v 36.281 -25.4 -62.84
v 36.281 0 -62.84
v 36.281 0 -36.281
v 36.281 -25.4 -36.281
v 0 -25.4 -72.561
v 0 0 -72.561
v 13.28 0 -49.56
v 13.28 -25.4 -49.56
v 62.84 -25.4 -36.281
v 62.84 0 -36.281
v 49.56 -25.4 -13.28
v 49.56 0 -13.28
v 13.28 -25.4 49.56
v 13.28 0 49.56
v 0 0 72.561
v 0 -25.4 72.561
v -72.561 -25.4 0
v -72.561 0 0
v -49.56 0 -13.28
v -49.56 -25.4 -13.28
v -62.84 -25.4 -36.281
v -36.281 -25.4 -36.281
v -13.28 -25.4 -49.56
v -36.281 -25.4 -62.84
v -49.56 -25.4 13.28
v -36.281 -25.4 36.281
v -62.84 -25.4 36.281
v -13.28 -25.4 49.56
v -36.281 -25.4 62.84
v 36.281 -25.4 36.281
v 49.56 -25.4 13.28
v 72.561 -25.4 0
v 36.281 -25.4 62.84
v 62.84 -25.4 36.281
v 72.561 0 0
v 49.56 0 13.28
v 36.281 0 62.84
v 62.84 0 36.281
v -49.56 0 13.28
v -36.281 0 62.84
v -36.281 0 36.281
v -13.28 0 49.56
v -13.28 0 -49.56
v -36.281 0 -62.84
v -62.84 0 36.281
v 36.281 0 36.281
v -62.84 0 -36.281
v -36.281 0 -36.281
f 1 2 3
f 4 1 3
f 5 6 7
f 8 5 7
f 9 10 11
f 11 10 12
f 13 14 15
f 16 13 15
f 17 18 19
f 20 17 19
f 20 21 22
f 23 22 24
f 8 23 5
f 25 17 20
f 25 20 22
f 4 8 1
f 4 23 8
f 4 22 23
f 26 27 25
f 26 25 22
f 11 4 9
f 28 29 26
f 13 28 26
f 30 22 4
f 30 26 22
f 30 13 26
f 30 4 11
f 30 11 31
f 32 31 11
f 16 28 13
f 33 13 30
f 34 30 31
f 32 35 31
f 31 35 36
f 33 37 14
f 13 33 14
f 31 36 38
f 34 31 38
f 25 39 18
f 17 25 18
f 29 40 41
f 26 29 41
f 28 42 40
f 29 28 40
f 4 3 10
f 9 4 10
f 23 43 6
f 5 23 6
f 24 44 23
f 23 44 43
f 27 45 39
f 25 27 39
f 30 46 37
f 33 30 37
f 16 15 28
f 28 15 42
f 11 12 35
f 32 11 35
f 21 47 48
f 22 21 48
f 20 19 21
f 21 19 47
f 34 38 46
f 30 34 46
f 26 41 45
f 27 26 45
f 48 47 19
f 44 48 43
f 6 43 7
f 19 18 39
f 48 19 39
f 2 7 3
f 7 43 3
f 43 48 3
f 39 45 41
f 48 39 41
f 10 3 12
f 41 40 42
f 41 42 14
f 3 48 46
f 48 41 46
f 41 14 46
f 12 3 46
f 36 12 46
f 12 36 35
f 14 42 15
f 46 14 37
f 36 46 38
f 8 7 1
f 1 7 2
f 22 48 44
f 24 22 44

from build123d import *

# Parameters (mm, degrees)
F0_R     = 38.1
F1_DEPTH = 25.4


with BuildPart() as f1:
    # F0 (on Front) → F1 (new body)
    with BuildSketch(Plane.XZ):
        with BuildLine():
            ThreePointArc((49.1988245643, 12.6536817364), (50.3981164721, 6.3772922205), (50.8, 0))
            ThreePointArc((50.8, 0), (50.3981164721, -6.3772922205), (49.1988245643, -12.6536817364))
            Line((49.1988245643, -12.6536817364), (49.5602090261, -13.2796179853))
            Line((49.5602090261, -13.2796179853), (72.5611820817, 0))
            Line((72.5611820817, 0), (49.5602090261, 13.2796179853))
            Line((49.5602090261, 13.2796179853), (49.1988245643, 12.6536817364))
        make_face()
        with BuildLine():
            ThreePointArc((48.9342727773, 13.641002447), (49.0690319755, 13.1480074912), (49.1988245643, 12.6536817364))
            Line((49.1988245643, 12.6536817364), (49.5602090261, 13.2796179853))
            Line((49.5602090261, 13.2796179853), (48.9342727773, 13.641002447))
        make_face()
        with BuildLine():
            Line((49.5602090261, -13.2796179853), (49.1988245643, -12.6536817364))
            ThreePointArc((49.1988245643, -12.6536817364), (49.0690319755, -13.1480074912), (48.9342727773, -13.641002447))
            Line((48.9342727773, -13.641002447), (49.5602090261, -13.2796179853))
        make_face()
        with BuildLine():
            ThreePointArc((36.2805910408, 35.5578221173), (43.9940905122, 25.4), (48.9342727773, 13.641002447))
            Line((48.9342727773, 13.641002447), (49.5602090261, 13.2796179853))
            Line((49.5602090261, 13.2796179853), (62.8398270114, 36.2805910408))
            Line((62.8398270114, 36.2805910408), (36.2805910408, 36.2805910408))
            Line((36.2805910408, 36.2805910408), (36.2805910408, 35.5578221173))
        make_face()
        with BuildLine():
            Line((49.5602090261, -13.2796179853), (48.9342727773, -13.641002447))
            ThreePointArc((48.9342727773, -13.641002447), (43.9940905122, -25.4), (36.2805910408, -35.5578221173))
            Line((36.2805910408, -35.5578221173), (36.2805910408, -36.2805910408))
            Line((36.2805910408, -36.2805910408), (62.8398270114, -36.2805910408))
            Line((62.8398270114, -36.2805910408), (49.5602090261, -13.2796179853))
        make_face()
        with BuildLine():
            ThreePointArc((35.5578221173, 36.2805910408), (35.9210244843, 35.9210244843), (36.2805910408, 35.5578221173))
            Line((36.2805910408, 35.5578221173), (36.2805910408, 36.2805910408))
            Line((36.2805910408, 36.2805910408), (35.5578221173, 36.2805910408))
        make_face()
        with BuildLine():
            Line((36.2805910408, -36.2805910408), (36.2805910408, -35.5578221173))
            ThreePointArc((36.2805910408, -35.5578221173), (35.9210244843, -35.9210244843), (35.5578221173, -36.2805910408))
            Line((35.5578221173, -36.2805910408), (36.2805910408, -36.2805910408))
        make_face()
        with BuildLine():
            ThreePointArc((13.641002447, 48.9342727773), (25.4, 43.9940905122), (35.5578221173, 36.2805910408))
            Line((35.5578221173, 36.2805910408), (36.2805910408, 36.2805910408))
            Line((36.2805910408, 36.2805910408), (36.2805910408, 62.8398270114))
            Line((36.2805910408, 62.8398270114), (13.2796179853, 49.5602090261))
            Line((13.2796179853, 49.5602090261), (13.641002447, 48.9342727773))
        make_face()
        with BuildLine():
            Line((36.2805910408, -36.2805910408), (35.5578221173, -36.2805910408))
            ThreePointArc((35.5578221173, -36.2805910408), (25.4, -43.9940905122), (13.641002447, -48.9342727773))
            Line((13.641002447, -48.9342727773), (13.2796179853, -49.5602090261))
            Line((13.2796179853, -49.5602090261), (36.2805910408, -62.8398270114))
            Line((36.2805910408, -62.8398270114), (36.2805910408, -36.2805910408))
        make_face()
        with BuildLine():
            ThreePointArc((12.6536817364, 49.1988245643), (13.1480074912, 49.0690319755), (13.641002447, 48.9342727773))
            Line((13.641002447, 48.9342727773), (13.2796179853, 49.5602090261))
            Line((13.2796179853, 49.5602090261), (12.6536817364, 49.1988245643))
        make_face()
        with BuildLine():
            Line((13.2796179853, -49.5602090261), (13.641002447, -48.9342727773))
            ThreePointArc((13.641002447, -48.9342727773), (13.1480074912, -49.0690319755), (12.6536817364, -49.1988245643))
            Line((12.6536817364, -49.1988245643), (13.2796179853, -49.5602090261))
        make_face()
        with BuildLine():
            ThreePointArc((-12.6536817364, 49.1988245643), (0, 50.8), (12.6536817364, 49.1988245643))
            Line((12.6536817364, 49.1988245643), (13.2796179853, 49.5602090261))
            Line((13.2796179853, 49.5602090261), (0, 72.5611820817))
            Line((0, 72.5611820817), (-13.2796179853, 49.5602090261))
            Line((-13.2796179853, 49.5602090261), (-12.6536817364, 49.1988245643))
        make_face()
        with BuildLine():
            Line((13.2796179853, -49.5602090261), (12.6536817364, -49.1988245643))
            ThreePointArc((12.6536817364, -49.1988245643), (0, -50.8), (-12.6536817364, -49.1988245643))
            Line((-12.6536817364, -49.1988245643), (-13.2796179853, -49.5602090261))
            Line((-13.2796179853, -49.5602090261), (0, -72.5611820817))
            Line((0, -72.5611820817), (13.2796179853, -49.5602090261))
        make_face()
        with BuildLine():
            ThreePointArc((-13.641002447, 48.9342727773), (-13.1480074912, 49.0690319755), (-12.6536817364, 49.1988245643))
            Line((-12.6536817364, 49.1988245643), (-13.2796179853, 49.5602090261))
            Line((-13.2796179853, 49.5602090261), (-13.641002447, 48.9342727773))
        make_face()
        with BuildLine():
            Line((-13.2796179853, -49.5602090261), (-12.6536817364, -49.1988245643))
            ThreePointArc((-12.6536817364, -49.1988245643), (-13.1480074912, -49.0690319755), (-13.641002447, -48.9342727773))
            Line((-13.641002447, -48.9342727773), (-13.2796179853, -49.5602090261))
        make_face()
        with BuildLine():
            ThreePointArc((-35.5578221173, 36.2805910408), (-25.4, 43.9940905122), (-13.641002447, 48.9342727773))
            Line((-13.641002447, 48.9342727773), (-13.2796179853, 49.5602090261))
            Line((-13.2796179853, 49.5602090261), (-36.2805910408, 62.8398270114))
            Line((-36.2805910408, 62.8398270114), (-36.2805910408, 36.2805910408))
            Line((-36.2805910408, 36.2805910408), (-35.5578221173, 36.2805910408))
        make_face()
        with BuildLine():
            Line((-13.2796179853, -49.5602090261), (-13.641002447, -48.9342727773))
            ThreePointArc((-13.641002447, -48.9342727773), (-25.4, -43.9940905122), (-35.5578221173, -36.2805910408))
            Line((-35.5578221173, -36.2805910408), (-36.2805910408, -36.2805910408))
            Line((-36.2805910408, -36.2805910408), (-36.2805910408, -62.8398270114))
            Line((-36.2805910408, -62.8398270114), (-13.2796179853, -49.5602090261))
        make_face()
        with BuildLine():
            ThreePointArc((-36.2805910408, 35.5578221173), (-35.9210244843, 35.9210244843), (-35.5578221173, 36.2805910408))
            Line((-35.5578221173, 36.2805910408), (-36.2805910408, 36.2805910408))
            Line((-36.2805910408, 36.2805910408), (-36.2805910408, 35.5578221173))
        make_face()
        with BuildLine():
            Line((-36.2805910408, -36.2805910408), (-35.5578221173, -36.2805910408))
            ThreePointArc((-35.5578221173, -36.2805910408), (-35.9210244843, -35.9210244843), (-36.2805910408, -35.5578221173))
            Line((-36.2805910408, -35.5578221173), (-36.2805910408, -36.2805910408))
        make_face()
        with BuildLine():
            ThreePointArc((-48.9342727773, 13.641002447), (-43.9940905122, 25.4), (-36.2805910408, 35.5578221173))
            Line((-36.2805910408, 35.5578221173), (-36.2805910408, 36.2805910408))
            Line((-36.2805910408, 36.2805910408), (-62.8398270114, 36.2805910408))
            Line((-62.8398270114, 36.2805910408), (-49.5602090261, 13.2796179853))
            Line((-49.5602090261, 13.2796179853), (-48.9342727773, 13.641002447))
        make_face()
        with BuildLine():
            Line((-36.2805910408, -36.2805910408), (-36.2805910408, -35.5578221173))
            ThreePointArc((-36.2805910408, -35.5578221173), (-43.9940905122, -25.4), (-48.9342727773, -13.641002447))
            Line((-48.9342727773, -13.641002447), (-49.5602090261, -13.2796179853))
            Line((-49.5602090261, -13.2796179853), (-62.8398270114, -36.2805910408))
            Line((-62.8398270114, -36.2805910408), (-36.2805910408, -36.2805910408))
        make_face()
        with BuildLine():
            ThreePointArc((-49.1988245643, 12.6536817364), (-49.0690319755, 13.1480074912), (-48.9342727773, 13.641002447))
            Line((-48.9342727773, 13.641002447), (-49.5602090261, 13.2796179853))
            Line((-49.5602090261, 13.2796179853), (-49.1988245643, 12.6536817364))
        make_face()
        with BuildLine():
            Line((-49.5602090261, -13.2796179853), (-48.9342727773, -13.641002447))
            ThreePointArc((-48.9342727773, -13.641002447), (-49.0690319755, -13.1480074912), (-49.1988245643, -12.6536817364))
            Line((-49.1988245643, -12.6536817364), (-49.5602090261, -13.2796179853))
        make_face()
        with BuildLine():
            ThreePointArc((-49.1988245643, -12.6536817364), (-50.8, 0), (-49.1988245643, 12.6536817364))
            Line((-49.1988245643, 12.6536817364), (-49.5602090261, 13.2796179853))
            Line((-49.5602090261, 13.2796179853), (-72.5611820817, 0))
            Line((-72.5611820817, 0), (-49.5602090261, -13.2796179853))
            Line((-49.5602090261, -13.2796179853), (-49.1988245643, -12.6536817364))
        make_face()
        with BuildLine():
            ThreePointArc((49.1988245643, -12.6536817364), (50.3981164721, -6.3772922205), (50.8, 0))
            ThreePointArc((50.8, 0), (50.3981164721, 6.3772922205), (49.1988245643, 12.6536817364))
            ThreePointArc((49.1988245643, 12.6536817364), (49.0690319755, 13.1480074912), (48.9342727773, 13.641002447))
            ThreePointArc((48.9342727773, 13.641002447), (43.9940905122, 25.4), (36.2805910408, 35.5578221173))
            ThreePointArc((36.2805910408, 35.5578221173), (35.9210244843, 35.9210244843), (35.5578221173, 36.2805910408))
            ThreePointArc((35.5578221173, 36.2805910408), (25.4, 43.9940905122), (13.641002447, 48.9342727773))
            ThreePointArc((13.641002447, 48.9342727773), (13.1480074912, 49.0690319755), (12.6536817364, 49.1988245643))
            ThreePointArc((12.6536817364, 49.1988245643), (0, 50.8), (-12.6536817364, 49.1988245643))
            ThreePointArc((-12.6536817364, 49.1988245643), (-13.1480074912, 49.0690319755), (-13.641002447, 48.9342727773))
            ThreePointArc((-13.641002447, 48.9342727773), (-25.4, 43.9940905122), (-35.5578221173, 36.2805910408))
            ThreePointArc((-35.5578221173, 36.2805910408), (-35.9210244843, 35.9210244843), (-36.2805910408, 35.5578221173))
            ThreePointArc((-36.2805910408, 35.5578221173), (-43.9940905122, 25.4), (-48.9342727773, 13.641002447))
            ThreePointArc((-48.9342727773, 13.641002447), (-49.0690319755, 13.1480074912), (-49.1988245643, 12.6536817364))
            ThreePointArc((-49.1988245643, 12.6536817364), (-50.8, 0), (-49.1988245643, -12.6536817364))
            ThreePointArc((-49.1988245643, -12.6536817364), (-49.0690319755, -13.1480074912), (-48.9342727773, -13.641002447))
            ThreePointArc((-48.9342727773, -13.641002447), (-43.9940905122, -25.4), (-36.2805910408, -35.5578221173))
            ThreePointArc((-36.2805910408, -35.5578221173), (-35.9210244843, -35.9210244843), (-35.5578221173, -36.2805910408))
            ThreePointArc((-35.5578221173, -36.2805910408), (-25.4, -43.9940905122), (-13.641002447, -48.9342727773))
            ThreePointArc((-13.641002447, -48.9342727773), (-13.1480074912, -49.0690319755), (-12.6536817364, -49.1988245643))
            ThreePointArc((-12.6536817364, -49.1988245643), (0, -50.8), (12.6536817364, -49.1988245643))
            ThreePointArc((12.6536817364, -49.1988245643), (13.1480074912, -49.0690319755), (13.641002447, -48.9342727773))
            ThreePointArc((13.641002447, -48.9342727773), (25.4, -43.9940905122), (35.5578221173, -36.2805910408))
            ThreePointArc((35.5578221173, -36.2805910408), (35.9210244843, -35.9210244843), (36.2805910408, -35.5578221173))
            ThreePointArc((36.2805910408, -35.5578221173), (43.9940905122, -25.4), (48.9342727773, -13.641002447))
            ThreePointArc((48.9342727773, -13.641002447), (49.0690319755, -13.1480074912), (49.1988245643, -12.6536817364))
        make_face()
        Circle(F0_R, mode=Mode.SUBTRACT)
        Circle(F0_R)
    extrude(amount=F1_DEPTH)


solid = f1.part
